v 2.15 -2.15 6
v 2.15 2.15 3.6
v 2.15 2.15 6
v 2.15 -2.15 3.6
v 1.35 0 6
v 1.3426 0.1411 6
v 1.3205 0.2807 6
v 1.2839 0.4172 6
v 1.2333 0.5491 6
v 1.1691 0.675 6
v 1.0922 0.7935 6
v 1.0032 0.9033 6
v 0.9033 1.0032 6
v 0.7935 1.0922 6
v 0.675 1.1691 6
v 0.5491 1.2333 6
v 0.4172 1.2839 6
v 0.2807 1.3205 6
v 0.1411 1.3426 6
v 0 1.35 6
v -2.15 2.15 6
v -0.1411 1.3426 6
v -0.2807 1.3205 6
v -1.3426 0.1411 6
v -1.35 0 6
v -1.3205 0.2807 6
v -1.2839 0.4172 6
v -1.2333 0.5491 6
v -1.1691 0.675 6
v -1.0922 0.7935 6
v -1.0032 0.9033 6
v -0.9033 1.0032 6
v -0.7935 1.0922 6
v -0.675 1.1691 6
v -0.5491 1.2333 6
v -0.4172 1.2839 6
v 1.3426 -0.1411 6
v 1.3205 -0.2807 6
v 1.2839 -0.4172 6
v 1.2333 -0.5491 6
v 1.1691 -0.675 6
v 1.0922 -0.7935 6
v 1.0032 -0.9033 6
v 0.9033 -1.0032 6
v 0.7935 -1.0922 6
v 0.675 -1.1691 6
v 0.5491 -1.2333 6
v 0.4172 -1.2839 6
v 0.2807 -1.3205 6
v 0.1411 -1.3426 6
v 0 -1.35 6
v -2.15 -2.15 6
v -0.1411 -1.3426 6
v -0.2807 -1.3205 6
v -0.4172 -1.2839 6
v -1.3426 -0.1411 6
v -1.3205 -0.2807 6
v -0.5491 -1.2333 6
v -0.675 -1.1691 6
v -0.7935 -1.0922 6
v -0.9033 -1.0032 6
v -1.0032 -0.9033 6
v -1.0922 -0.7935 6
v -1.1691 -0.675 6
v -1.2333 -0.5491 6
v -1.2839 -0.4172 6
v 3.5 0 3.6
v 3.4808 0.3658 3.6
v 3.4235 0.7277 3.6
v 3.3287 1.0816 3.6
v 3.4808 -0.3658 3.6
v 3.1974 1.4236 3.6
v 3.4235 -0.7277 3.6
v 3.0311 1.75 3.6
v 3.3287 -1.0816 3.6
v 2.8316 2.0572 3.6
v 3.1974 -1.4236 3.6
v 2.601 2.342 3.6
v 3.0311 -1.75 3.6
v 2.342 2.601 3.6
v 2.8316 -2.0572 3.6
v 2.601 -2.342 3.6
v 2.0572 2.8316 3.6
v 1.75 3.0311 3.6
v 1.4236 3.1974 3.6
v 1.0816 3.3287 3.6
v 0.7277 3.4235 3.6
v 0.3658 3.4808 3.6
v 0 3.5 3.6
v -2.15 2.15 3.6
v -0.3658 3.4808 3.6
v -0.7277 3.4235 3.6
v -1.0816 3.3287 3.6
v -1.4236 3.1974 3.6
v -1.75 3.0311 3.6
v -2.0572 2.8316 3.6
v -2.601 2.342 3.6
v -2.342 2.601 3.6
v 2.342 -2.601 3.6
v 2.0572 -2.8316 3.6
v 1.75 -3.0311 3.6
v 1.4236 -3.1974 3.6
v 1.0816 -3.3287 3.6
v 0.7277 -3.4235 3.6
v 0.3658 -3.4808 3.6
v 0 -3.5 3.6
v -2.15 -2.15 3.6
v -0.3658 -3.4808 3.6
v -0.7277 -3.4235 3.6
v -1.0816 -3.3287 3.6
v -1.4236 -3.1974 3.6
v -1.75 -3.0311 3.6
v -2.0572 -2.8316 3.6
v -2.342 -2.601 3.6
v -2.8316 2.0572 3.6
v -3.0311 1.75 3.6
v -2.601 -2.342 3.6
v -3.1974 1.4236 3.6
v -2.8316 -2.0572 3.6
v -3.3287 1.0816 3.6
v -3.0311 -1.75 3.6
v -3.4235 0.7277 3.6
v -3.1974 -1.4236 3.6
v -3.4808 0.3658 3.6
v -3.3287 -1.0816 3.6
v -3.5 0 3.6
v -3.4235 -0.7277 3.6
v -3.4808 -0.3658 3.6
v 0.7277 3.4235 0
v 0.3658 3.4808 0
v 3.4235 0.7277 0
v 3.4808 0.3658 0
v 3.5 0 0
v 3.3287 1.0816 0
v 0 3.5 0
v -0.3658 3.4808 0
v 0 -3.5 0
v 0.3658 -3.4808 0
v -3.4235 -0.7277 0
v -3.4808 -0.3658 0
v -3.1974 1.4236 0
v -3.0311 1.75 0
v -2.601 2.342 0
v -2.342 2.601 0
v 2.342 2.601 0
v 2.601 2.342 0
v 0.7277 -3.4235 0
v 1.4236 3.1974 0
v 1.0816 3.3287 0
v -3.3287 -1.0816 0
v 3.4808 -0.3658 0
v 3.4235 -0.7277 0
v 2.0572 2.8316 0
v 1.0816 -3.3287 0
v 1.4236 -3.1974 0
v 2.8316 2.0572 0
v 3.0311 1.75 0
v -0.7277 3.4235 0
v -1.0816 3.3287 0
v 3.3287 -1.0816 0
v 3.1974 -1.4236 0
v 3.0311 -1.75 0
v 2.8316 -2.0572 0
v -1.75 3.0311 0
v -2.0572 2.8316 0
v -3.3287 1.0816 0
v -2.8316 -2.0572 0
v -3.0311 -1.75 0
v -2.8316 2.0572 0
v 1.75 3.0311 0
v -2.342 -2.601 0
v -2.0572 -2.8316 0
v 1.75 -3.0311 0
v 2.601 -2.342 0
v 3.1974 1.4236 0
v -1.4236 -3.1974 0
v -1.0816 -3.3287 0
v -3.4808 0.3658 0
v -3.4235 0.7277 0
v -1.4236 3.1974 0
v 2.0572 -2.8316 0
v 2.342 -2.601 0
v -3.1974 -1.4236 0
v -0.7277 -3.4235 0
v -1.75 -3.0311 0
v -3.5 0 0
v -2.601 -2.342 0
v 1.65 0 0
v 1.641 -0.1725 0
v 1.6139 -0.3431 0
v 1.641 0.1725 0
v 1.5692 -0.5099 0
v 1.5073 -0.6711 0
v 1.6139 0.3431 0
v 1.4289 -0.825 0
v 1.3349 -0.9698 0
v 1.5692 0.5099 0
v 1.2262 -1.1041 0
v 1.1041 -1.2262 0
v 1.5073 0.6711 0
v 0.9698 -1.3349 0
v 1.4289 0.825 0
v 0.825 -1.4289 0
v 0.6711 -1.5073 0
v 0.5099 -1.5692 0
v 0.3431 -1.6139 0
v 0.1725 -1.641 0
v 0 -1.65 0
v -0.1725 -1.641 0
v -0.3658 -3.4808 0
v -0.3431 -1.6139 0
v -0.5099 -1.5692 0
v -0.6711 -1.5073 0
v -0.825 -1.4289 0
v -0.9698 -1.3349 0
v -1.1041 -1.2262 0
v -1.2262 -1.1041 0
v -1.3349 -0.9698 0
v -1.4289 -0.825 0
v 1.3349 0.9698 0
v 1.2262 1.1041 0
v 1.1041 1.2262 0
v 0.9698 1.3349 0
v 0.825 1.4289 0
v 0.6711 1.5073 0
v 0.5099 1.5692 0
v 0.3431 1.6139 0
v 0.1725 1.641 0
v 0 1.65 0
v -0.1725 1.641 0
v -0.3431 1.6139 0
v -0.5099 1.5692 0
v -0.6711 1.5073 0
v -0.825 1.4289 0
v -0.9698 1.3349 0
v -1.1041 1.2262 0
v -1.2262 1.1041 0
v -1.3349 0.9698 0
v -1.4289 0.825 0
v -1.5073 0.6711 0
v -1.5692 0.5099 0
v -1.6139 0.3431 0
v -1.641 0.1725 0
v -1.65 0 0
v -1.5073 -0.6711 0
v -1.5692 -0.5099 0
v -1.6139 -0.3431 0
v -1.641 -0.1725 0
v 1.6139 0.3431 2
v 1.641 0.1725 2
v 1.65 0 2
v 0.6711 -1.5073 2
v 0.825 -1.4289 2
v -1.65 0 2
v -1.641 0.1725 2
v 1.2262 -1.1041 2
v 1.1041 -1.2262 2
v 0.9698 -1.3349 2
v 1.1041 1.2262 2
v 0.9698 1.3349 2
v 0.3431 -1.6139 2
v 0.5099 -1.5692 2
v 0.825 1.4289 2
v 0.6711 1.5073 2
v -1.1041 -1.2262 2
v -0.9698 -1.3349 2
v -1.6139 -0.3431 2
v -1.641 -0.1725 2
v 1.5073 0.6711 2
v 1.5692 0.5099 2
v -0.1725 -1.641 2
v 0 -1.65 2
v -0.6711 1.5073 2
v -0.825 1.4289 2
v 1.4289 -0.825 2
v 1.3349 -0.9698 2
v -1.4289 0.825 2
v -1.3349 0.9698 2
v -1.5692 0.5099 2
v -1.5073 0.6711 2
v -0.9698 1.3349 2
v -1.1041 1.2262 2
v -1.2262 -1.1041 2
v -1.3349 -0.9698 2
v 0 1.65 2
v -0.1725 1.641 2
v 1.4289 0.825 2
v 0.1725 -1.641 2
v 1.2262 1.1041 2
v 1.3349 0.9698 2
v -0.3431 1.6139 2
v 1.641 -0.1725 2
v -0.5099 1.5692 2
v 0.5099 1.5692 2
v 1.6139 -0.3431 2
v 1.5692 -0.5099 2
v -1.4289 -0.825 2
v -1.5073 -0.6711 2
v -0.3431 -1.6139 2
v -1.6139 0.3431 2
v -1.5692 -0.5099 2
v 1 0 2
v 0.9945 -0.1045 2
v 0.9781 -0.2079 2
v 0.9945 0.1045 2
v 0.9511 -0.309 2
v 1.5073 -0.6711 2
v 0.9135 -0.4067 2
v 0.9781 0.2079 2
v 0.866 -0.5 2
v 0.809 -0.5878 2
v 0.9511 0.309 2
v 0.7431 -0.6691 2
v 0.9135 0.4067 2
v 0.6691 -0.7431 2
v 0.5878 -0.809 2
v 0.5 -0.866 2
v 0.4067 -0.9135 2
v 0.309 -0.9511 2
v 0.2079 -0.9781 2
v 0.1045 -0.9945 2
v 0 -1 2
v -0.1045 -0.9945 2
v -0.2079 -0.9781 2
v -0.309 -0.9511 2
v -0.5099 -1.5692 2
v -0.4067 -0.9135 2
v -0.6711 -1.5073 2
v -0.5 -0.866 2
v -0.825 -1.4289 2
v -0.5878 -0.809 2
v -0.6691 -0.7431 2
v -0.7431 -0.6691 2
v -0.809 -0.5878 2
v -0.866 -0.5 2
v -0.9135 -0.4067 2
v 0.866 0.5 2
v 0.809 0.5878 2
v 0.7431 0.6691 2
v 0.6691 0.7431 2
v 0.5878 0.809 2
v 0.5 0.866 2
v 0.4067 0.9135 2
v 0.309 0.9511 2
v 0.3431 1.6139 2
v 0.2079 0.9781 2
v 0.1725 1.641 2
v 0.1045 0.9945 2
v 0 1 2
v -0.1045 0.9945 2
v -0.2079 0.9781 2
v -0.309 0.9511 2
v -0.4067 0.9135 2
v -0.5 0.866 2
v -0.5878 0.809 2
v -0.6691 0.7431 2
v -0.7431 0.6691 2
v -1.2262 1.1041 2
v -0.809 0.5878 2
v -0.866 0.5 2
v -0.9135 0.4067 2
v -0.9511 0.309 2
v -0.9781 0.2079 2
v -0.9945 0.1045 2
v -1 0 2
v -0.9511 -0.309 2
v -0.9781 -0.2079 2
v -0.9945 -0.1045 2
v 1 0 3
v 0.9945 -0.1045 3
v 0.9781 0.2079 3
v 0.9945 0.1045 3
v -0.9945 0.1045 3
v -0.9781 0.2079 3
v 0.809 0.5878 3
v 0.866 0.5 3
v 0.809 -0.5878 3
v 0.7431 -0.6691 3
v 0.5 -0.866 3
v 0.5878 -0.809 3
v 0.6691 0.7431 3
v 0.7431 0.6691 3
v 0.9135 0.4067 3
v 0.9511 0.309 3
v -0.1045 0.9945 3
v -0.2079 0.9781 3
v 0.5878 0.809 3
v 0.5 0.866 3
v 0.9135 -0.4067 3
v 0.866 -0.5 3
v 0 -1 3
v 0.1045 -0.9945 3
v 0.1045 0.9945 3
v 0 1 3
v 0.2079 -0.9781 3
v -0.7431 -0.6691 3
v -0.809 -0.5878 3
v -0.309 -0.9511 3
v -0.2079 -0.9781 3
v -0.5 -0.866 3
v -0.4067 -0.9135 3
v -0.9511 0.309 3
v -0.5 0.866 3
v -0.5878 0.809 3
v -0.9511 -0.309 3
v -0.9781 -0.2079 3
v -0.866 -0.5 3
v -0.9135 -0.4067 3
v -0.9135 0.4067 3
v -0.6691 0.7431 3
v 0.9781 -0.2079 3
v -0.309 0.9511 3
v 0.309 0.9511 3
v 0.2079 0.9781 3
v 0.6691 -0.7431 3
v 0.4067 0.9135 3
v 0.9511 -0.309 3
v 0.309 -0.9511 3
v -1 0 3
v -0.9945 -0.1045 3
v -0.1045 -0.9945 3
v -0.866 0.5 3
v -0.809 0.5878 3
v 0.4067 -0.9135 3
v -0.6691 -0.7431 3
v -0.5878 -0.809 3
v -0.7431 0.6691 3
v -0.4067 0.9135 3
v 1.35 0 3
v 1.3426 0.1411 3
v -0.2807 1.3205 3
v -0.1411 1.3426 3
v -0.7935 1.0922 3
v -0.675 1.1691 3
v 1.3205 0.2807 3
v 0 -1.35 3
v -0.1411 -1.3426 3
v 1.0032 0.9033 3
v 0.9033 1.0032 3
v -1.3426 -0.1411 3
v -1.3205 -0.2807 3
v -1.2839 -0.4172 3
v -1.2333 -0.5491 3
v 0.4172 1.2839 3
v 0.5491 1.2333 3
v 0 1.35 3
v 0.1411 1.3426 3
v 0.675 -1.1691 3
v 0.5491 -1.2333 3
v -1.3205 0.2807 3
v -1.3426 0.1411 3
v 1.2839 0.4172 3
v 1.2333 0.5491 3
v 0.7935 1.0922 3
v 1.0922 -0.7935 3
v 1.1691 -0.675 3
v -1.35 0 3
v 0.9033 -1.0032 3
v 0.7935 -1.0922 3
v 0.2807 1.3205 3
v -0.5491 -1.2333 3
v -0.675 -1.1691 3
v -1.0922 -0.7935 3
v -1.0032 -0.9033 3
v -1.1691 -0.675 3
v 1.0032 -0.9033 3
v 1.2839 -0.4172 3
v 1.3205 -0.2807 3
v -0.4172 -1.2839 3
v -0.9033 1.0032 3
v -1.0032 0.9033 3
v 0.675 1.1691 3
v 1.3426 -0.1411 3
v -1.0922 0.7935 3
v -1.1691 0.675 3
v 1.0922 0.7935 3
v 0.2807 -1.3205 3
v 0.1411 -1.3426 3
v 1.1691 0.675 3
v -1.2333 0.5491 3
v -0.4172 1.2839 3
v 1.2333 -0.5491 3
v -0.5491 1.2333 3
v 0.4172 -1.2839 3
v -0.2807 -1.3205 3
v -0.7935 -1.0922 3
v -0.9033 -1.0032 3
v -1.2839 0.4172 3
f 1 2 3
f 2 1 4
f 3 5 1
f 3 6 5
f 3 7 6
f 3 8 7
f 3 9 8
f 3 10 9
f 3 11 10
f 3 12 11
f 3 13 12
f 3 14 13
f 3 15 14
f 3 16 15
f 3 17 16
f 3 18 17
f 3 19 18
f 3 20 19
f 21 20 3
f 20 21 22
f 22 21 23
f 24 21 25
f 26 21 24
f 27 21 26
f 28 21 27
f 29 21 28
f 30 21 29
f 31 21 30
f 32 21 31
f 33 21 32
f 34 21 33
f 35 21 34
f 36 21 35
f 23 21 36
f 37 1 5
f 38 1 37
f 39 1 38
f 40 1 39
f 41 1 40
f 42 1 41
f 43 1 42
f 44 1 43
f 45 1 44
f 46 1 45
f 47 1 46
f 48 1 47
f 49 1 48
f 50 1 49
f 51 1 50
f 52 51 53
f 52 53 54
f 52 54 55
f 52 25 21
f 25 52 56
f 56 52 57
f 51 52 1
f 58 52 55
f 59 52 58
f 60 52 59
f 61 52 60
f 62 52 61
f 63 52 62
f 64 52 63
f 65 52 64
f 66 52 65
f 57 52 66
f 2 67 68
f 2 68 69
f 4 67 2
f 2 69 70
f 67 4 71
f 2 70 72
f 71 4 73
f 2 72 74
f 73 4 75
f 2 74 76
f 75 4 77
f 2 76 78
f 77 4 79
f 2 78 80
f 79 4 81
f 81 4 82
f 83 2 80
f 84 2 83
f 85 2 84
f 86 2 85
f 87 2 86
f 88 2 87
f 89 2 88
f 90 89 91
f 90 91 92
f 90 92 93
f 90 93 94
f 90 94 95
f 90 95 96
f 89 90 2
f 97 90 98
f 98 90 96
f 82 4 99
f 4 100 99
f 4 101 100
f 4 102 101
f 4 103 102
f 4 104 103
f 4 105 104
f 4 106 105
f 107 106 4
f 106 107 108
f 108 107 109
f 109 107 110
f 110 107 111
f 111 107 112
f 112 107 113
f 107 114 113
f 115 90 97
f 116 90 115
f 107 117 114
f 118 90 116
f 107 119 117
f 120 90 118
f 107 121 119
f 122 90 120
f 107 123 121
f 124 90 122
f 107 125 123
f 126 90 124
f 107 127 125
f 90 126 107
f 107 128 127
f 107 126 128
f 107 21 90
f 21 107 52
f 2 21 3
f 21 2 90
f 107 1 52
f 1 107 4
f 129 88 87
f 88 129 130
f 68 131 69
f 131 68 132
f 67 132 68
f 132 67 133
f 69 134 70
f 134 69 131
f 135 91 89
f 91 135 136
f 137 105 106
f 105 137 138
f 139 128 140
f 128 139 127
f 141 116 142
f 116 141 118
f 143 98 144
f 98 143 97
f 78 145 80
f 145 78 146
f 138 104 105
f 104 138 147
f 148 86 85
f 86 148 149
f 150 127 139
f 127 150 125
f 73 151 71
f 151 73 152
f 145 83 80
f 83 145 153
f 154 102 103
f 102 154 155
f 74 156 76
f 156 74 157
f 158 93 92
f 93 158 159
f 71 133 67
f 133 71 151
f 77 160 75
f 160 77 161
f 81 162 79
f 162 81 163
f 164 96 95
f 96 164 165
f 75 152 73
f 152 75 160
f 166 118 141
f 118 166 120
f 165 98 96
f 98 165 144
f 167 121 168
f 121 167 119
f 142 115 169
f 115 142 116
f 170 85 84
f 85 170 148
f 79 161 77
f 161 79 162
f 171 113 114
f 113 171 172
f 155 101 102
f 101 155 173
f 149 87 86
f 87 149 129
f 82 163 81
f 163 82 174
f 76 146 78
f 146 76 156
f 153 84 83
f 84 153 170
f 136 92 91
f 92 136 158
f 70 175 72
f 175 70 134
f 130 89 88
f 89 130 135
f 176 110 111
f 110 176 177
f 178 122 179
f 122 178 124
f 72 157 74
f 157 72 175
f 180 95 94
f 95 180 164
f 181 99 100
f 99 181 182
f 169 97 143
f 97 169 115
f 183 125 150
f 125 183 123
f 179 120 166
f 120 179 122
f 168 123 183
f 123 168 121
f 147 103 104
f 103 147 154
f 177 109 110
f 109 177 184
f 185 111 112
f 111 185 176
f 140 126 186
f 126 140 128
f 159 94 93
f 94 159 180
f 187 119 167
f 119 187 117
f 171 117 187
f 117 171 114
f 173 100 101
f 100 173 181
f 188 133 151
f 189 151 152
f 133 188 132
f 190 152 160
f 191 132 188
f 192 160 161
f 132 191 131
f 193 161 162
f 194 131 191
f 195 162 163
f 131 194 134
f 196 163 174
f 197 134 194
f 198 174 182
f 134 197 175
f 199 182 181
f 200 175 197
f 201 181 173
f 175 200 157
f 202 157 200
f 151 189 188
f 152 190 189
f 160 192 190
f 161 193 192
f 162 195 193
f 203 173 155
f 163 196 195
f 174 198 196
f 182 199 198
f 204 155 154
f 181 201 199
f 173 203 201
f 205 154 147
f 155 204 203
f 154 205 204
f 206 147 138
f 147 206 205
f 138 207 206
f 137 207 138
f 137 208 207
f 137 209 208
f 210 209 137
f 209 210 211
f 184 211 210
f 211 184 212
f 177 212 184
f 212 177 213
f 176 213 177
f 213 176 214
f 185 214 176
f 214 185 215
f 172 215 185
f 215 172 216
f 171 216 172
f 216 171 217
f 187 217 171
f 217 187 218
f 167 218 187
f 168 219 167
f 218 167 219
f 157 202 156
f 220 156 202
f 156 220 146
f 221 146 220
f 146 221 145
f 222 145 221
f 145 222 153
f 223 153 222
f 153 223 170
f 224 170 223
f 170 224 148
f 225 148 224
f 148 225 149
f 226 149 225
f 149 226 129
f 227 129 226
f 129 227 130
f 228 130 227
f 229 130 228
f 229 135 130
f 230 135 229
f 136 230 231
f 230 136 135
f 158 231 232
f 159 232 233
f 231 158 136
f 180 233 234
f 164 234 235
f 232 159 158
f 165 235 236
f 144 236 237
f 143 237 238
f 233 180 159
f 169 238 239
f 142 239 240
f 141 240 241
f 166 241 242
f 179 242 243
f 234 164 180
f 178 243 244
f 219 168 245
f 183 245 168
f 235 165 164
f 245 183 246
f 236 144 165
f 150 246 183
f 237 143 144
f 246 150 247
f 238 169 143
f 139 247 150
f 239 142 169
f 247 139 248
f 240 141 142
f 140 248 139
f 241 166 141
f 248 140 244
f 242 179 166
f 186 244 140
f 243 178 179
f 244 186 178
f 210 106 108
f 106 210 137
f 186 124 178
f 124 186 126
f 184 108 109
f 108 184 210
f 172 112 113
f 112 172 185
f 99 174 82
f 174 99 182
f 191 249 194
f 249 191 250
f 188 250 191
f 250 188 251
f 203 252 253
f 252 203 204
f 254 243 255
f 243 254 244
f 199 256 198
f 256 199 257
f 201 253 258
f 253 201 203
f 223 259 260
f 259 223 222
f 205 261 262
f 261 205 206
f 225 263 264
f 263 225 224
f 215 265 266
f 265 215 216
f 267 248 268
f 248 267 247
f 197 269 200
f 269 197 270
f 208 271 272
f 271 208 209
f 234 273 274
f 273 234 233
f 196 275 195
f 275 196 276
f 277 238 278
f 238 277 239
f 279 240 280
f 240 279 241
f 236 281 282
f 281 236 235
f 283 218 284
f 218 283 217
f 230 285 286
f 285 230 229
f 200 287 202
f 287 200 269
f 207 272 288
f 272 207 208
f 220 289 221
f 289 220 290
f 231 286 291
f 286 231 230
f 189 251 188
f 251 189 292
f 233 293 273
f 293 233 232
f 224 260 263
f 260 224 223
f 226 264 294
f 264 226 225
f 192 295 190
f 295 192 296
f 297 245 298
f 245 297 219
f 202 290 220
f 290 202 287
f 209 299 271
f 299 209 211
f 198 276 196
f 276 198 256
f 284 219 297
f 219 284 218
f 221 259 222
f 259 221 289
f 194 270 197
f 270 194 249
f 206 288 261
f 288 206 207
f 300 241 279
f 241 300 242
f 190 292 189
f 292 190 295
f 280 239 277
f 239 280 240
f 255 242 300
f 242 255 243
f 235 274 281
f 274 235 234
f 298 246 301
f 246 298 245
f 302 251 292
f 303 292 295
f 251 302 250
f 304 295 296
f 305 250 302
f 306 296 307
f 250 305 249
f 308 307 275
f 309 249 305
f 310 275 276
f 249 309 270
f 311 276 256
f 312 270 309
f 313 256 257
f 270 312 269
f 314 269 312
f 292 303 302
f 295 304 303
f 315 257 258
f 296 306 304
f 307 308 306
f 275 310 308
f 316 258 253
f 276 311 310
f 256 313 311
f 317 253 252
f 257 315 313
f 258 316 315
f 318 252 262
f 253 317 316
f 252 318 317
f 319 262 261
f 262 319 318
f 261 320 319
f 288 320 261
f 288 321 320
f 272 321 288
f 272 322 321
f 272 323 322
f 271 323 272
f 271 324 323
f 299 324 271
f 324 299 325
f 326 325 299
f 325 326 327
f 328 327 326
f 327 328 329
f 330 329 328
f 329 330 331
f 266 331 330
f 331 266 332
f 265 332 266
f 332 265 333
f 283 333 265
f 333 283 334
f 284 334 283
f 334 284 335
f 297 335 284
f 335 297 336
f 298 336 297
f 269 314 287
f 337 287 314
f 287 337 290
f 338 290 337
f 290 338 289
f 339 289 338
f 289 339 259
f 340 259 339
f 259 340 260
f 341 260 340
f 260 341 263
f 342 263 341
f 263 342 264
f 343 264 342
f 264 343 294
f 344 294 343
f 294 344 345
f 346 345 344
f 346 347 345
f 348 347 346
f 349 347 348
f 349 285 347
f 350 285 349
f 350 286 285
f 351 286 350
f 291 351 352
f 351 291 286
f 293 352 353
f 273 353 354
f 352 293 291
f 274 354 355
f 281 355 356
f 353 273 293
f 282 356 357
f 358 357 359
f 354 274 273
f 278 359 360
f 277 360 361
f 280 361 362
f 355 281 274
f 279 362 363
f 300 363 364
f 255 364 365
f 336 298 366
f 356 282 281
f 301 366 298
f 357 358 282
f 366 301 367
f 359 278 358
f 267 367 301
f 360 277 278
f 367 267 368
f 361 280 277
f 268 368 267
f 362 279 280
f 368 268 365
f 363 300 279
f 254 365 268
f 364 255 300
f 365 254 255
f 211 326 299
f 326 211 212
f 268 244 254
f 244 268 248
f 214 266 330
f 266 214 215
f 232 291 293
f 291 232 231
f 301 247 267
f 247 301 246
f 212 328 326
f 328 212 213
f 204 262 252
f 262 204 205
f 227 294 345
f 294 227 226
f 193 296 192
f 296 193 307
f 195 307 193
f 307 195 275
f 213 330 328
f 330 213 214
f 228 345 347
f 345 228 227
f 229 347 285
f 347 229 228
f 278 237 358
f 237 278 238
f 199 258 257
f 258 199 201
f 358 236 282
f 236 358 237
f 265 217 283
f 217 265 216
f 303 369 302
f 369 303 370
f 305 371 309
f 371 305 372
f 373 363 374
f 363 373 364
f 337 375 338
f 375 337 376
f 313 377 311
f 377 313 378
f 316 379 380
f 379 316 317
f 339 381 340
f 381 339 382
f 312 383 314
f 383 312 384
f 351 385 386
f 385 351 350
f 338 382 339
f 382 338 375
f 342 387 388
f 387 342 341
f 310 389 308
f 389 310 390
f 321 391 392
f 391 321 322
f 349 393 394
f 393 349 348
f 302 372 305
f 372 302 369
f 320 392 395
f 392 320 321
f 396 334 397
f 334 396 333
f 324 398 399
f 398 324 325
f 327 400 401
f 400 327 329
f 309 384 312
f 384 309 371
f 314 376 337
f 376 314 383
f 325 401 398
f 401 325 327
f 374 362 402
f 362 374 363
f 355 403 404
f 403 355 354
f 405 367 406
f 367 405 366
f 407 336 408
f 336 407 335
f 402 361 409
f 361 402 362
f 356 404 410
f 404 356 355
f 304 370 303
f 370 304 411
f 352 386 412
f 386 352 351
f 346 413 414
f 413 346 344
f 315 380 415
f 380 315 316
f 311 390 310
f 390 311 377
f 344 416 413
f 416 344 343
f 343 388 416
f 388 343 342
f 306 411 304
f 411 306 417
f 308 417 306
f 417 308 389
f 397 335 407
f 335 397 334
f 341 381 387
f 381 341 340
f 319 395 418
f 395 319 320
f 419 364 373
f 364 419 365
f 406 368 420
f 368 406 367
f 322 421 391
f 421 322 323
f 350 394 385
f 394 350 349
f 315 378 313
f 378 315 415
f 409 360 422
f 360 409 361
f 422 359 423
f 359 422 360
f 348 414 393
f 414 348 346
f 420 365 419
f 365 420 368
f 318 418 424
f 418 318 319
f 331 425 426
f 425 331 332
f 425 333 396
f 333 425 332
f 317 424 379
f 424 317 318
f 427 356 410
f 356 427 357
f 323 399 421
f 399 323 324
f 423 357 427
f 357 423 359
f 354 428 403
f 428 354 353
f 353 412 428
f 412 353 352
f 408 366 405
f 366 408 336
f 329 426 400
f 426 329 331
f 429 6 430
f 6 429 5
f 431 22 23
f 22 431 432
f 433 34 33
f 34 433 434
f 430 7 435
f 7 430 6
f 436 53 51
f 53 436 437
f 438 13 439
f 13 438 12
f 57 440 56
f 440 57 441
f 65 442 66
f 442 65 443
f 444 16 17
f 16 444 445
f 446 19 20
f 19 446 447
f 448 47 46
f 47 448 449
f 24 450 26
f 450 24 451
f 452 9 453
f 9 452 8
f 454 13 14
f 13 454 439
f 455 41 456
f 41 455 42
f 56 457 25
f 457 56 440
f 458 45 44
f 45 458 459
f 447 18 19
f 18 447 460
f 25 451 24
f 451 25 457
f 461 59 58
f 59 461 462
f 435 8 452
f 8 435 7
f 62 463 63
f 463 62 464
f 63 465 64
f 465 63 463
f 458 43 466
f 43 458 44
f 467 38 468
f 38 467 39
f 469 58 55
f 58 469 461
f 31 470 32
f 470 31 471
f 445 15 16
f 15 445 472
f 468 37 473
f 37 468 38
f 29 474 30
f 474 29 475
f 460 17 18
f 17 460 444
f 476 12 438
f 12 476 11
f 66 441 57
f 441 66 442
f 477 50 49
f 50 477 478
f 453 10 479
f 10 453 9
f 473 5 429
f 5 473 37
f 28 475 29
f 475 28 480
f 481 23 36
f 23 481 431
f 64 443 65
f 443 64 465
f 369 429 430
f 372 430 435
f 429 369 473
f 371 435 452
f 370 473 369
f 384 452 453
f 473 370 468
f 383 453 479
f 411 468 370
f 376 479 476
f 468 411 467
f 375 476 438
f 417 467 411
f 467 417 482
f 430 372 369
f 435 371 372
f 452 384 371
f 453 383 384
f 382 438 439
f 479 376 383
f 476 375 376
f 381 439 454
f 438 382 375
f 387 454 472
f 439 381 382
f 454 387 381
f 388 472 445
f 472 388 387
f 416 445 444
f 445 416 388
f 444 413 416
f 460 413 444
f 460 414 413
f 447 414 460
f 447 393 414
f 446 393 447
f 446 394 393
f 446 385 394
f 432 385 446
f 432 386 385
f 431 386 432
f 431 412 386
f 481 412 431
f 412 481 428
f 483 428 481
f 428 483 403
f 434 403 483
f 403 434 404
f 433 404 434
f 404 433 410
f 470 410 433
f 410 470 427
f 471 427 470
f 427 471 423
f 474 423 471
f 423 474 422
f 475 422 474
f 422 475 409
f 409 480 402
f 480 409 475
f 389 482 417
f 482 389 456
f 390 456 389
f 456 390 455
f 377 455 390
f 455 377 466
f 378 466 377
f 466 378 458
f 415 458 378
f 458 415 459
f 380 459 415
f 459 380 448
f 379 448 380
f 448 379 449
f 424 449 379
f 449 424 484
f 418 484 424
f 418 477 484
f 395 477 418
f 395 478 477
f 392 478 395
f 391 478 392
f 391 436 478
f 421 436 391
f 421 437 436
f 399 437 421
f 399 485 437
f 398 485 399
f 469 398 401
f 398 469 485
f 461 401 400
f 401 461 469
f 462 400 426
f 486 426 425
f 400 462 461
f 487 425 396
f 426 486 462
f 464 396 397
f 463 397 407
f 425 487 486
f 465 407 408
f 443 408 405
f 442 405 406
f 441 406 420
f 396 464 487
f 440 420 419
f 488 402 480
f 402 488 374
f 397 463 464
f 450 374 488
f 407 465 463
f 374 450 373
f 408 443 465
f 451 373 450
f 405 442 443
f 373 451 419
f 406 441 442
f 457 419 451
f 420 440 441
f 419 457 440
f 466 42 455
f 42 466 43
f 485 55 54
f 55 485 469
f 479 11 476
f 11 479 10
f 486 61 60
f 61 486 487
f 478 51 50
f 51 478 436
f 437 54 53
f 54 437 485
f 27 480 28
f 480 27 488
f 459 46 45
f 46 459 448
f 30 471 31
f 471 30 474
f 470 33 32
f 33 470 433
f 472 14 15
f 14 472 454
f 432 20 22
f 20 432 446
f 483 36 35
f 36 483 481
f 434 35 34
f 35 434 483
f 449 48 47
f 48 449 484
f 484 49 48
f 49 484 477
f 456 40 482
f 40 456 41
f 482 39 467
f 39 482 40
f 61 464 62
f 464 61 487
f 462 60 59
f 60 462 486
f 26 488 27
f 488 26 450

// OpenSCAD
cube_width        = 4.3; // measured: 4.5
cube_height       = 2.4; // measured: 2.4
base_dia          = 7.0; // measured: 7.0
base_height       = 3.6; // measured: 0.6
bottom_hole_dia   = 3.3; // measured: 3.1
bottom_hole_depth = 2.0; // measured: 2.0
hole_dia          = 2.0; // measured: 1.8
screw_head_dia    = 2.7; // measured: 2.5
screw_head_depth  = 3.0; // measured: 3.0

$fn = 60;

difference() {
union() {
translate([-cube_width/2, -cube_width/2, base_height])
cube([cube_width, cube_width, cube_height]);

cylinder(d=base_dia, h=base_height);
}

translate([0, 0, -bottom_hole_depth])
cylinder(d=bottom_hole_dia, h=2*bottom_hole_depth);

cylinder(d=hole_dia, h=10);

translate([0, 0, screw_head_depth])
cylinder(d=screw_head_dia, h=10);
}
